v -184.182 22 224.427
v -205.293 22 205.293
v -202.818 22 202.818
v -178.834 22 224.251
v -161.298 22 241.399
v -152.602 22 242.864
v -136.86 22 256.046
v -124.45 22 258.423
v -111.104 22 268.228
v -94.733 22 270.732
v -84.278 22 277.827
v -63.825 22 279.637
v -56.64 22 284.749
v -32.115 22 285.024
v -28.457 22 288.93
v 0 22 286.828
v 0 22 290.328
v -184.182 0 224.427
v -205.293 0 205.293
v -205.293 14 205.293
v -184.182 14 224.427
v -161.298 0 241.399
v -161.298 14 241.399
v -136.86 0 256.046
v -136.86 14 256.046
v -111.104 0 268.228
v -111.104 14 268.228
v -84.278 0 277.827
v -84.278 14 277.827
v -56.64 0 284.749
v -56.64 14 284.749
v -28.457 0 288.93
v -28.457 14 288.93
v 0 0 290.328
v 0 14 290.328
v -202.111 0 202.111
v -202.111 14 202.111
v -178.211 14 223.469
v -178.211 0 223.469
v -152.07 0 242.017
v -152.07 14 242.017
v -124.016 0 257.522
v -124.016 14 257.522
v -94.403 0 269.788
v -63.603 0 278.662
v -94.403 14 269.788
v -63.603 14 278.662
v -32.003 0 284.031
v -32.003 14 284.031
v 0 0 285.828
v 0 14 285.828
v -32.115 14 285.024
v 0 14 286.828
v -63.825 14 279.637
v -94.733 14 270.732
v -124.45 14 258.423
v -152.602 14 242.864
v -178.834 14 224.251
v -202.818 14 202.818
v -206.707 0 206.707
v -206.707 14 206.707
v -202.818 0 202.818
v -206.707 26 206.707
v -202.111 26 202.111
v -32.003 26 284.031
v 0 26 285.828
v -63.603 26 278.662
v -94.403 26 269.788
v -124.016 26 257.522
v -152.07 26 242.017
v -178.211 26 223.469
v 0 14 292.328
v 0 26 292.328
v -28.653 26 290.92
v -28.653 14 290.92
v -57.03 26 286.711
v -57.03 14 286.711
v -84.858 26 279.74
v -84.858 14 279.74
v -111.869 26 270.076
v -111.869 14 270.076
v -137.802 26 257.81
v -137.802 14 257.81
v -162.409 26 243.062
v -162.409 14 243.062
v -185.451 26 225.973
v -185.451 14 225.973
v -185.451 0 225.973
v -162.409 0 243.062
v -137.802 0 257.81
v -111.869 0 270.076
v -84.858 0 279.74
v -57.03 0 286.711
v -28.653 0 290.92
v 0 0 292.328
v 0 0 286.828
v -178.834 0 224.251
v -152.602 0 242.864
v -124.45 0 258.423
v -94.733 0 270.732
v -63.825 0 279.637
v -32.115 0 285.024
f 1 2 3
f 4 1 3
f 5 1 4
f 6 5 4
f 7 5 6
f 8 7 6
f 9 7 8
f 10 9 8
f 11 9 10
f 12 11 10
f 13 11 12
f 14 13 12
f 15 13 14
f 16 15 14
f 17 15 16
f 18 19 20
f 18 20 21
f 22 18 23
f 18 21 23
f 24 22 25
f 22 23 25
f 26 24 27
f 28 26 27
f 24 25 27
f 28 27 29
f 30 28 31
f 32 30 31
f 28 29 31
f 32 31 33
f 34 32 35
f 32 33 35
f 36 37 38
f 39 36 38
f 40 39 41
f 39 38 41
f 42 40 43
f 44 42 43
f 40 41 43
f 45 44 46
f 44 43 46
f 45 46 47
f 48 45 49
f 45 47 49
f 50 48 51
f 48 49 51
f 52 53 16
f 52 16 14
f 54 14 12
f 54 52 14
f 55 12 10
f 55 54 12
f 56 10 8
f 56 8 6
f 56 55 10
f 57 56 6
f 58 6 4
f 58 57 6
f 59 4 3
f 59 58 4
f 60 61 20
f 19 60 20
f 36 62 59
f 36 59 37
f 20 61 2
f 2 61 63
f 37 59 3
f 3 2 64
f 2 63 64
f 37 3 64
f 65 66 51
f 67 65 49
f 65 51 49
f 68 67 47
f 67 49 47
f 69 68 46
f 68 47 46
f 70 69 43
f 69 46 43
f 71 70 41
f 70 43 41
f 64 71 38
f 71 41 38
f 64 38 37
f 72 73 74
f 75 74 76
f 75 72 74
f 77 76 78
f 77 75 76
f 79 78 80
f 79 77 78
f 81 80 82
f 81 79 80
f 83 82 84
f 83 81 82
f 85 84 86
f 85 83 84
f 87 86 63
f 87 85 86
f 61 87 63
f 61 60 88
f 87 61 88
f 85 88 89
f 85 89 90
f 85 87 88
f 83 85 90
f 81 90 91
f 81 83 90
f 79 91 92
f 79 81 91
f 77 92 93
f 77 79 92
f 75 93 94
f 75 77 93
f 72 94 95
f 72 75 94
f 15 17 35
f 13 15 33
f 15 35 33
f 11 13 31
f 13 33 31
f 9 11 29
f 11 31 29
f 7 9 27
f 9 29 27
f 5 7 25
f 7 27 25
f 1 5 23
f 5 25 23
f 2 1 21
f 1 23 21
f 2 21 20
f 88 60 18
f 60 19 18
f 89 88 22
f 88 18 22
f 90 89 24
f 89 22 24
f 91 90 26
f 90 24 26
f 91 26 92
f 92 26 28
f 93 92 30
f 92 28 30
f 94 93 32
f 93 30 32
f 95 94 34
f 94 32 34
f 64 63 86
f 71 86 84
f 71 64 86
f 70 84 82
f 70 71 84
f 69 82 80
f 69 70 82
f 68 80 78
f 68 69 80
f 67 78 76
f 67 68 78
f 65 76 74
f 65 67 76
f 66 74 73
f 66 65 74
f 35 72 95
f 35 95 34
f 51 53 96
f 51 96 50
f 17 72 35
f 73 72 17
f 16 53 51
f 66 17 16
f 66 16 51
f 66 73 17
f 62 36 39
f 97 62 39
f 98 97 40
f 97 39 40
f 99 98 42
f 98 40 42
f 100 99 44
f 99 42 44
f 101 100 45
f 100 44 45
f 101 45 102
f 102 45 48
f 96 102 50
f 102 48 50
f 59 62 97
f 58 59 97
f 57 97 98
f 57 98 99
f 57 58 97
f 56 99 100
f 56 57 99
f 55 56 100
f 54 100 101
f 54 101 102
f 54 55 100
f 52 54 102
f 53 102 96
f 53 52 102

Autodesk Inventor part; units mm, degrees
ref_plane "YZ Plane" through (0, 0, 0) normal (1, 0, 0) x (0, 1, 0)
ref_plane "XZ Plane" through (0, 0, 0) normal (0, 1, 0) x (-1, 0, 0)
ref_plane "XY Plane" through (0, 0, 0) normal (0, 0, 1) x (1, 0, 0)
sketch "スケッチ1" plane through (0, 0, 0) normal (0, 1, 0) x (-1, 0, 0)
  circle A0 centre (0, 0) radius 287.828
  circle A1 centre (0, 0) radius 289.328
  line L0 (204.5858, 204.5858) -> (0, 0)
  line L1 (0, 0) -> (0, 289.328)
  point P0 (0, 287.828)
  point P1 (203.5251, 203.5251)
  dimension "d0" = 575.656
  dimension "d1" = 578.656
  dimension "d2" = 45
extrude "押し出し1" add sketch "スケッチ1" along normal blind 14 contours A0 L1 A1 L0 picked at (198.6715, 209.3726)
sketch "スケッチ2" plane through (0, 14, 0) normal (0, 1, 0) x (1, 0, 0)
  arc A0 (-203.5251, -203.5251) -> (0, -287.828) centre (0, 0) ccw projected
  line L0 (-203.5251, -203.5251) -> (-204.5858, -204.5858) projected
  arc A1 (-204.5858, -204.5858) -> (0, -289.328) centre (0, 0) ccw projected
  line L1 (0, -289.328) -> (0, -287.828) projected
  circle A2 centre (0, 0) radius 286.828
  circle A3 centre (0, 0) radius 285.828
  circle A4 centre (0, 0) radius 290.328
  circle A5 centre (0, 0) radius 292.328
  line L2 (-206.7071, -206.7071) -> (-202.1109, -202.1109)
  line L3 (0, -292.328) -> (0, -285.828)
  point P0 (0, -290.328)
  point P1 (-205.2929, -205.2929)
  point P2 (0, -286.828)
  point P3 (-202.818, -202.818)
  dimension "d5" = 1
  dimension "d6" = 1
  dimension "d7" = 1
  dimension "d8" = 2
extrude "押し出し2" add sketch "スケッチ2" against normal up to surface (14 mm away) contours L2 A3 L3 A2 | A4 L3 A5 L2 picked at (-162.1553, -235.9498) picked at (-183.4103, -226.5178)
sketch "スケッチ3" plane through (0, 14, 0) normal (0, 1, 0) x (1, 0, 0)
  arc A0 (-205.2929, -205.2929) -> (0, -290.328) centre (0, 0) ccw projected
  line L0 (-205.2929, -205.2929) -> (-206.7071, -206.7071) projected
  arc A1 (-206.7071, -206.7071) -> (0, -292.328) centre (0, 0) ccw projected
  line L1 (0, -292.328) -> (0, -290.328) projected
  arc A2 (-203.5251, -203.5251) -> (0, -287.828) centre (0, 0) ccw projected
  arc A3 (-203.5251, -203.5251) -> (0, -287.828) centre (0, 0) ccw projected
  line L2 (-203.5251, -203.5251) -> (-204.5858, -204.5858) projected
  arc A4 (-204.5858, -204.5858) -> (0, -289.328) centre (0, 0) ccw projected
  line L3 (0, -289.328) -> (0, -287.828) projected
  arc A5 (-202.1109, -202.1109) -> (0, -285.828) centre (0, 0) ccw projected
  line L4 (-202.1109, -202.1109) -> (-202.818, -202.818) projected
  arc A6 (-202.818, -202.818) -> (0, -286.828) centre (0, 0) ccw projected
  line L5 (0, -286.828) -> (0, -285.828) projected
  line L6 (-206.7071, -206.7071) -> (-202.1109, -202.1109)
  line L7 (0, -286.828) -> (0, -292.328)
extrude "押し出し3" add sketch "スケッチ3" along normal blind 12
extrude "押し出し4" cut sketch "スケッチ1" along normal up to surface (14 mm away) contours A0 L1 A1 L0 picked at (198.6715, 209.3726)
sketch "スケッチ4" plane through (0, 14, 0) normal (0, -1, 0) x (1, 0, 0)
  line L0 (-202.818, 202.818) -> (-205.2929, 205.2929) projected
  arc A0 (0, 286.828) -> (-202.818, 202.818) centre (0, 0) ccw projected
  line L1 (0, 290.328) -> (0, 286.828) projected
  arc A1 (0, 290.328) -> (-205.2929, 205.2929) centre (0, 0) ccw projected
extrude "押し出し5" cut sketch "スケッチ4" against normal blind 8
equation "\"d7\" = d5"
properties part number "23"
